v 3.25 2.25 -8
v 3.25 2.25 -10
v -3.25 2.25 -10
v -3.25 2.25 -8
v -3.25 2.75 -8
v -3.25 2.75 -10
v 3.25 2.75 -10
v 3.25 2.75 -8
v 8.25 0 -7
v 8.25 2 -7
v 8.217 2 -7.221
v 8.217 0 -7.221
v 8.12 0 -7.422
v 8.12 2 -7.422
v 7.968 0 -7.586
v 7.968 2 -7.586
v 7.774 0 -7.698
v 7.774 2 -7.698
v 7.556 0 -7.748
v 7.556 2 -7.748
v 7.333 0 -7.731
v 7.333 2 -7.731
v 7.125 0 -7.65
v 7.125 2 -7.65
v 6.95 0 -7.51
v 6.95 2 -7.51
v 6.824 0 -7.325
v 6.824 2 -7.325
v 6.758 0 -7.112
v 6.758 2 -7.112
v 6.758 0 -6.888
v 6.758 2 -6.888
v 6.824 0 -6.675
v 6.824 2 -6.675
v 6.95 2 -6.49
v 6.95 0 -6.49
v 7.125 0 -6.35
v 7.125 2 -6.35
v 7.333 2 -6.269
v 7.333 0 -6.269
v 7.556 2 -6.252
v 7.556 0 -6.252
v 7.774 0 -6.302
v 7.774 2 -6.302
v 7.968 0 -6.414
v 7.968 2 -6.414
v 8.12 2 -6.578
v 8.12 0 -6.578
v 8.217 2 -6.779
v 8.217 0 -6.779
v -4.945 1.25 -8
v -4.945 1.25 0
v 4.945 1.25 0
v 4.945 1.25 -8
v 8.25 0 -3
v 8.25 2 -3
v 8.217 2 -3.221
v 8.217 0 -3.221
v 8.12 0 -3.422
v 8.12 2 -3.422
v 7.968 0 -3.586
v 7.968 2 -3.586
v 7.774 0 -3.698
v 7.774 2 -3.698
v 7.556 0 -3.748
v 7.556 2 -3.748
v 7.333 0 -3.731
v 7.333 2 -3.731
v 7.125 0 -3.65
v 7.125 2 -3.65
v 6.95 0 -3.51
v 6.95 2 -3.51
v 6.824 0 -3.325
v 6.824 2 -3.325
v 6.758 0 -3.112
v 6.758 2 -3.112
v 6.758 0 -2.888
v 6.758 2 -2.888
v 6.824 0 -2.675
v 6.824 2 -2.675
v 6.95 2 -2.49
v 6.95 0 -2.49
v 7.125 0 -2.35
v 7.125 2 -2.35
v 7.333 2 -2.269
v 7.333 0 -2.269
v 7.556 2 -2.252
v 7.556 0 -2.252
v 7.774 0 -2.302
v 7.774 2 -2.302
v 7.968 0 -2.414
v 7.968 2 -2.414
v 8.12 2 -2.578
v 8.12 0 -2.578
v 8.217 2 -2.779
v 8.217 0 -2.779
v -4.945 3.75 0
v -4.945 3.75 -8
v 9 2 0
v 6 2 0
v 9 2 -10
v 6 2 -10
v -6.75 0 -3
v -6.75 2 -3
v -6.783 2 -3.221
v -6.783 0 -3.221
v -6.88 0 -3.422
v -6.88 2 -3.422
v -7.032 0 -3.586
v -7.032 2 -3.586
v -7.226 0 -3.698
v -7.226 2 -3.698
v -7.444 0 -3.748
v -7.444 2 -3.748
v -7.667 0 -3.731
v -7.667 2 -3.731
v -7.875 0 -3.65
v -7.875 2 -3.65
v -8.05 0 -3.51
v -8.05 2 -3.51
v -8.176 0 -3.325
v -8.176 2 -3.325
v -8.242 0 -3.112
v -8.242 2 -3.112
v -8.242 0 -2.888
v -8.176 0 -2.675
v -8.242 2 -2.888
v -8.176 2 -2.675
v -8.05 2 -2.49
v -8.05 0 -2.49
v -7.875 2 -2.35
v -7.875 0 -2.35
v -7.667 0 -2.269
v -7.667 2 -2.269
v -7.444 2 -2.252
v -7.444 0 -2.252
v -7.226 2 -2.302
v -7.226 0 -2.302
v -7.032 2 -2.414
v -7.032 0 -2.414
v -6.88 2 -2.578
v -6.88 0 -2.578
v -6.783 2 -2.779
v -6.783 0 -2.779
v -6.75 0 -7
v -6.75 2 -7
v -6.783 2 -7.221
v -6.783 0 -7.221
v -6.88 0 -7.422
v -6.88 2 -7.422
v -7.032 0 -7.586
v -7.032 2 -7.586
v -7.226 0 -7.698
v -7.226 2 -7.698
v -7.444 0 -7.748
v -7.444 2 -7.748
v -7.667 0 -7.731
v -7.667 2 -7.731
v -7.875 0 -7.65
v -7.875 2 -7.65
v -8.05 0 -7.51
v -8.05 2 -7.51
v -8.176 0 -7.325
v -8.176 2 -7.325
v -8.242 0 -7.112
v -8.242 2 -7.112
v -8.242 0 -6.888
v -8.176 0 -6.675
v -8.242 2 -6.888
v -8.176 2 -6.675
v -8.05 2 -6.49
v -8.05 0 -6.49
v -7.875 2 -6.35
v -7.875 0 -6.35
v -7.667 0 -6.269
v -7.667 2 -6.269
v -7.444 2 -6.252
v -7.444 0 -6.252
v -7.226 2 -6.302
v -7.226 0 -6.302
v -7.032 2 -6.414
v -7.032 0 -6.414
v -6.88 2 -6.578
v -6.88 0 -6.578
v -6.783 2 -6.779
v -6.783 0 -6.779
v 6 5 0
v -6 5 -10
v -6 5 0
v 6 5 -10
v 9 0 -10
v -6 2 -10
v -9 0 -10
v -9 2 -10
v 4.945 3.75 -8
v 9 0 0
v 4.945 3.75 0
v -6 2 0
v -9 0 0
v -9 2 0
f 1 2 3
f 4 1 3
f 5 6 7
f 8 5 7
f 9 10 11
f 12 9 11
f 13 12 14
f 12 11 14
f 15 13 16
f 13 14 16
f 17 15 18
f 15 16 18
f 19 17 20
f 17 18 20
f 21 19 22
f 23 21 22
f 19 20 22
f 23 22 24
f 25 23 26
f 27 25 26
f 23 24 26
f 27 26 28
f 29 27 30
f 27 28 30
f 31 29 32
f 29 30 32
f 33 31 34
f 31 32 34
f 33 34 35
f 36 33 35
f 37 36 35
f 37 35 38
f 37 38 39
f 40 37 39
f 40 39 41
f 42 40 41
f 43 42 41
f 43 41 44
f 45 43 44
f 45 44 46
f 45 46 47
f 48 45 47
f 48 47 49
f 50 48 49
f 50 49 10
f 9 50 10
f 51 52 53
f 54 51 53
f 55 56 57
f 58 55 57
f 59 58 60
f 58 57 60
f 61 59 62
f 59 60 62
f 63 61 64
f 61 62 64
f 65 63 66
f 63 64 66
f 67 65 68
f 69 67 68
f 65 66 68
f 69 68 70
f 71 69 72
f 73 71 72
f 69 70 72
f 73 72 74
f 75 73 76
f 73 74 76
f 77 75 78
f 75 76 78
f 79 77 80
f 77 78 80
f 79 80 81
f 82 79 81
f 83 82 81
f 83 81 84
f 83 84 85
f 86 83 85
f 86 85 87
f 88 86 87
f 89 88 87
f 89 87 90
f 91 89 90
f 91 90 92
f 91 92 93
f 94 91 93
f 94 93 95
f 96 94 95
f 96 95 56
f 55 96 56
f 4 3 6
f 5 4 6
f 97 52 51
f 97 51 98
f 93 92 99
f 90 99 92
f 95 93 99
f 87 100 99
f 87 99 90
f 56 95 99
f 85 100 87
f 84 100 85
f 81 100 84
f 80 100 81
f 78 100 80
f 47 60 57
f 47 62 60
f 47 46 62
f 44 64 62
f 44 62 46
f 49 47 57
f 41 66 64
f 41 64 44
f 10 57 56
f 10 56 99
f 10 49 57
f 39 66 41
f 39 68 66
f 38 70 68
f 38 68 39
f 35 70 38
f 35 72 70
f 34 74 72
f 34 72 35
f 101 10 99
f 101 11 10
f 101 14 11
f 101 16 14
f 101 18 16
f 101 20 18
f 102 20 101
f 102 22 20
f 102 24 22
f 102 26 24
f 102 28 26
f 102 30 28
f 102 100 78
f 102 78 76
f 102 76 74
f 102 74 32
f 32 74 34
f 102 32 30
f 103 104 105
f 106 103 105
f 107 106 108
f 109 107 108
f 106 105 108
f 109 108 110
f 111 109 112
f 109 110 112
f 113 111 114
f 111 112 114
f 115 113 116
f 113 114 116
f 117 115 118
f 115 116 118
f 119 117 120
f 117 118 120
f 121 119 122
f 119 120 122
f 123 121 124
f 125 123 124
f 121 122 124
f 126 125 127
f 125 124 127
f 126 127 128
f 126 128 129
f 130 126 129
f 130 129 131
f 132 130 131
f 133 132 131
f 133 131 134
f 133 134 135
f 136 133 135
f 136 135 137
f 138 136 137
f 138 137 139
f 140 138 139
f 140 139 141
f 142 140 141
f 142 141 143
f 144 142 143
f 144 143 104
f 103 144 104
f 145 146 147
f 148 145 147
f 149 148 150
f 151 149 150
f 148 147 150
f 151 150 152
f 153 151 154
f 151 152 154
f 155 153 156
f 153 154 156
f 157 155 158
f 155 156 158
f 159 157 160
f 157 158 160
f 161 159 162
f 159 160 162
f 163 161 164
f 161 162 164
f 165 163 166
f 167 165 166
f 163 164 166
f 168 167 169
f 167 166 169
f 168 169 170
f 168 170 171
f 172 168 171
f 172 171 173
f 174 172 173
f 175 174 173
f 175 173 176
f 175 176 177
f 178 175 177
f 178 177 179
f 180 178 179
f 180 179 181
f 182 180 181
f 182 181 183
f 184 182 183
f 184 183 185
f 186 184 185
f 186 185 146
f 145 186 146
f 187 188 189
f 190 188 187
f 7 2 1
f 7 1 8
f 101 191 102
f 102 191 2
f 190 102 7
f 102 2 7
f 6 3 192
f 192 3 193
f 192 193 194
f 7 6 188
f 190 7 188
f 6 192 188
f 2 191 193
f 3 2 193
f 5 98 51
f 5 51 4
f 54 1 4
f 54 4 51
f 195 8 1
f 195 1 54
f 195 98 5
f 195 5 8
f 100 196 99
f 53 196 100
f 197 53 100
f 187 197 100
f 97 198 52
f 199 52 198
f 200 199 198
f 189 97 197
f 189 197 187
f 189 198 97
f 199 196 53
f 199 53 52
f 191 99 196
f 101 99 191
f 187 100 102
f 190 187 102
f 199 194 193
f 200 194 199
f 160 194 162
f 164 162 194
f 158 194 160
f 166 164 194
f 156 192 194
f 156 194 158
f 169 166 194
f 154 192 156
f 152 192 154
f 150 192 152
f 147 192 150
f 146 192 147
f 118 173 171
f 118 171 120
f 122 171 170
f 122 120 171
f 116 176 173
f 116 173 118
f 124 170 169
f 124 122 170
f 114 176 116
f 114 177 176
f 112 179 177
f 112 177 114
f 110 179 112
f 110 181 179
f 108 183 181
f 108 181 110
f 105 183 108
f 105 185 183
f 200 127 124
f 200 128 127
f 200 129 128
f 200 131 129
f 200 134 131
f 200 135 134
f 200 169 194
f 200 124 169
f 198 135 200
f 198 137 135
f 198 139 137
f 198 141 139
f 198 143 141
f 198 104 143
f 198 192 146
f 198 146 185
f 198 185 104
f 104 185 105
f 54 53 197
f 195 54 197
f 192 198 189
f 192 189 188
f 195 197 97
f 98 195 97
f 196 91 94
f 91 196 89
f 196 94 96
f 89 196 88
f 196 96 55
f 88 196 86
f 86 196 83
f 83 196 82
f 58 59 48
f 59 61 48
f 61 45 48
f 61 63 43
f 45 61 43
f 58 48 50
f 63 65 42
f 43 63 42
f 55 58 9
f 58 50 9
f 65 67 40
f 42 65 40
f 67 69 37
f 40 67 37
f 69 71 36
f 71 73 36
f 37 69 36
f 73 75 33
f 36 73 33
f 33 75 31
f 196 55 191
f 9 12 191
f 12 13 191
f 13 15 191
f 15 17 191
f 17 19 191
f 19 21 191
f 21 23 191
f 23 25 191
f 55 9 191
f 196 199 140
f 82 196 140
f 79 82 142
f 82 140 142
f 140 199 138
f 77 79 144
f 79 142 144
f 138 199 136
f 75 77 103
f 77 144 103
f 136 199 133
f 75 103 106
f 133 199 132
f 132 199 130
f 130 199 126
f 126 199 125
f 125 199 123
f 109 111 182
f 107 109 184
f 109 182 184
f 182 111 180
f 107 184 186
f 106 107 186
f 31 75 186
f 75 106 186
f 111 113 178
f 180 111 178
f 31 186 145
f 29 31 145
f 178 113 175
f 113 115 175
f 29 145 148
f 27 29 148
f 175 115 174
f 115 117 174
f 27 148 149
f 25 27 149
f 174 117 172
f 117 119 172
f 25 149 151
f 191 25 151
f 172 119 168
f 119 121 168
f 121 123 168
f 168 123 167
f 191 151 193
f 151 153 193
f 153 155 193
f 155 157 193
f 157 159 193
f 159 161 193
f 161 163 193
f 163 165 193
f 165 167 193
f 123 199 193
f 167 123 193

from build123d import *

# Parameters (mm, degrees)
SKETCH2_W           = 6
SKETCH2_H           = 10
BOSS_EXTRUDE2_DEPTH = 5
SKETCH4_W           = 4.945
SKETCH4_H           = 2.5
CUT_EXTRUDE1_DEPTH  = 8
SKETCH6_W           = 3.25
SKETCH6_H           = 0.5
CUT_EXTRUDE2_DEPTH  = 8
SKETCH7_W           = 10
SKETCH7_H           = 1.999993684
BOSS_EXTRUDE3_DEPTH = 3
SKETCH8_W           = 10
SKETCH8_H           = 2
BOSS_EXTRUDE4_DEPTH = 3
SKETCH11_R          = 0.75
CUT_EXTRUDE7_DEPTH  = 3


with BuildPart() as part:
    # Sketch2 → Boss-Extrude2 (new body)
    with BuildSketch(Plane(origin=(0, 0, 0), x_dir=(1, 0, 0), z_dir=(0, 1, 0))):
        with Locations((-3, 5)):
            Rectangle(SKETCH2_W, SKETCH2_H)
        with Locations((3, 5)):
            Rectangle(SKETCH2_W, SKETCH2_H)
    extrude(amount=BOSS_EXTRUDE2_DEPTH)

    # Sketch4 → Cut-Extrude1 (cut)
    with BuildSketch(Plane.XY):
        with Locations((-2.4725, 2.5)):
            Rectangle(SKETCH4_W, SKETCH4_H)
        with Locations((2.4725, 2.5)):
            Rectangle(SKETCH4_W, SKETCH4_H)
    extrude(amount=-CUT_EXTRUDE1_DEPTH, mode=Mode.SUBTRACT)

    # Sketch6 → Cut-Extrude2 (cut)
    with BuildSketch(Plane(origin=(0, 0, -10), x_dir=(-1, 0, 0), z_dir=(0, 0, -1))):
        with Locations((-1.625, 2.5)):
            Rectangle(SKETCH6_W, SKETCH6_H)
        with Locations((1.625, 2.5)):
            Rectangle(SKETCH6_W, SKETCH6_H)
    extrude(amount=-CUT_EXTRUDE2_DEPTH, mode=Mode.SUBTRACT)

    # Sketch7 → Boss-Extrude3 (add)
    with BuildSketch(Plane.ZY.offset(6)):
        with Locations((-5, 0.999996842)):
            Rectangle(SKETCH7_W, SKETCH7_H)
    extrude(amount=BOSS_EXTRUDE3_DEPTH)

    # Sketch8 → Boss-Extrude4 (add)
    with BuildSketch(Plane(origin=(6, 0, 0), x_dir=(0, 0, -1), z_dir=(1, 0, 0))):
        with Locations((5, 1)):
            Rectangle(SKETCH8_W, SKETCH8_H)
    extrude(amount=BOSS_EXTRUDE4_DEPTH)

    # Sketch11 → Cut-Extrude7 (cut)
    with BuildSketch(Plane(origin=(0, 2, 0), x_dir=(1, 0, 0), z_dir=(0, 1, 0))):
        with Locations((-7.5, 7)):
            Circle(SKETCH11_R)
        with Locations((-7.5, 3)):
            Circle(SKETCH11_R)
        with Locations((7.5, 3)):
            Circle(SKETCH11_R)
        with Locations((7.5, 7)):
            Circle(SKETCH11_R)
    extrude(amount=-CUT_EXTRUDE7_DEPTH, mode=Mode.SUBTRACT)


solid = part.part
